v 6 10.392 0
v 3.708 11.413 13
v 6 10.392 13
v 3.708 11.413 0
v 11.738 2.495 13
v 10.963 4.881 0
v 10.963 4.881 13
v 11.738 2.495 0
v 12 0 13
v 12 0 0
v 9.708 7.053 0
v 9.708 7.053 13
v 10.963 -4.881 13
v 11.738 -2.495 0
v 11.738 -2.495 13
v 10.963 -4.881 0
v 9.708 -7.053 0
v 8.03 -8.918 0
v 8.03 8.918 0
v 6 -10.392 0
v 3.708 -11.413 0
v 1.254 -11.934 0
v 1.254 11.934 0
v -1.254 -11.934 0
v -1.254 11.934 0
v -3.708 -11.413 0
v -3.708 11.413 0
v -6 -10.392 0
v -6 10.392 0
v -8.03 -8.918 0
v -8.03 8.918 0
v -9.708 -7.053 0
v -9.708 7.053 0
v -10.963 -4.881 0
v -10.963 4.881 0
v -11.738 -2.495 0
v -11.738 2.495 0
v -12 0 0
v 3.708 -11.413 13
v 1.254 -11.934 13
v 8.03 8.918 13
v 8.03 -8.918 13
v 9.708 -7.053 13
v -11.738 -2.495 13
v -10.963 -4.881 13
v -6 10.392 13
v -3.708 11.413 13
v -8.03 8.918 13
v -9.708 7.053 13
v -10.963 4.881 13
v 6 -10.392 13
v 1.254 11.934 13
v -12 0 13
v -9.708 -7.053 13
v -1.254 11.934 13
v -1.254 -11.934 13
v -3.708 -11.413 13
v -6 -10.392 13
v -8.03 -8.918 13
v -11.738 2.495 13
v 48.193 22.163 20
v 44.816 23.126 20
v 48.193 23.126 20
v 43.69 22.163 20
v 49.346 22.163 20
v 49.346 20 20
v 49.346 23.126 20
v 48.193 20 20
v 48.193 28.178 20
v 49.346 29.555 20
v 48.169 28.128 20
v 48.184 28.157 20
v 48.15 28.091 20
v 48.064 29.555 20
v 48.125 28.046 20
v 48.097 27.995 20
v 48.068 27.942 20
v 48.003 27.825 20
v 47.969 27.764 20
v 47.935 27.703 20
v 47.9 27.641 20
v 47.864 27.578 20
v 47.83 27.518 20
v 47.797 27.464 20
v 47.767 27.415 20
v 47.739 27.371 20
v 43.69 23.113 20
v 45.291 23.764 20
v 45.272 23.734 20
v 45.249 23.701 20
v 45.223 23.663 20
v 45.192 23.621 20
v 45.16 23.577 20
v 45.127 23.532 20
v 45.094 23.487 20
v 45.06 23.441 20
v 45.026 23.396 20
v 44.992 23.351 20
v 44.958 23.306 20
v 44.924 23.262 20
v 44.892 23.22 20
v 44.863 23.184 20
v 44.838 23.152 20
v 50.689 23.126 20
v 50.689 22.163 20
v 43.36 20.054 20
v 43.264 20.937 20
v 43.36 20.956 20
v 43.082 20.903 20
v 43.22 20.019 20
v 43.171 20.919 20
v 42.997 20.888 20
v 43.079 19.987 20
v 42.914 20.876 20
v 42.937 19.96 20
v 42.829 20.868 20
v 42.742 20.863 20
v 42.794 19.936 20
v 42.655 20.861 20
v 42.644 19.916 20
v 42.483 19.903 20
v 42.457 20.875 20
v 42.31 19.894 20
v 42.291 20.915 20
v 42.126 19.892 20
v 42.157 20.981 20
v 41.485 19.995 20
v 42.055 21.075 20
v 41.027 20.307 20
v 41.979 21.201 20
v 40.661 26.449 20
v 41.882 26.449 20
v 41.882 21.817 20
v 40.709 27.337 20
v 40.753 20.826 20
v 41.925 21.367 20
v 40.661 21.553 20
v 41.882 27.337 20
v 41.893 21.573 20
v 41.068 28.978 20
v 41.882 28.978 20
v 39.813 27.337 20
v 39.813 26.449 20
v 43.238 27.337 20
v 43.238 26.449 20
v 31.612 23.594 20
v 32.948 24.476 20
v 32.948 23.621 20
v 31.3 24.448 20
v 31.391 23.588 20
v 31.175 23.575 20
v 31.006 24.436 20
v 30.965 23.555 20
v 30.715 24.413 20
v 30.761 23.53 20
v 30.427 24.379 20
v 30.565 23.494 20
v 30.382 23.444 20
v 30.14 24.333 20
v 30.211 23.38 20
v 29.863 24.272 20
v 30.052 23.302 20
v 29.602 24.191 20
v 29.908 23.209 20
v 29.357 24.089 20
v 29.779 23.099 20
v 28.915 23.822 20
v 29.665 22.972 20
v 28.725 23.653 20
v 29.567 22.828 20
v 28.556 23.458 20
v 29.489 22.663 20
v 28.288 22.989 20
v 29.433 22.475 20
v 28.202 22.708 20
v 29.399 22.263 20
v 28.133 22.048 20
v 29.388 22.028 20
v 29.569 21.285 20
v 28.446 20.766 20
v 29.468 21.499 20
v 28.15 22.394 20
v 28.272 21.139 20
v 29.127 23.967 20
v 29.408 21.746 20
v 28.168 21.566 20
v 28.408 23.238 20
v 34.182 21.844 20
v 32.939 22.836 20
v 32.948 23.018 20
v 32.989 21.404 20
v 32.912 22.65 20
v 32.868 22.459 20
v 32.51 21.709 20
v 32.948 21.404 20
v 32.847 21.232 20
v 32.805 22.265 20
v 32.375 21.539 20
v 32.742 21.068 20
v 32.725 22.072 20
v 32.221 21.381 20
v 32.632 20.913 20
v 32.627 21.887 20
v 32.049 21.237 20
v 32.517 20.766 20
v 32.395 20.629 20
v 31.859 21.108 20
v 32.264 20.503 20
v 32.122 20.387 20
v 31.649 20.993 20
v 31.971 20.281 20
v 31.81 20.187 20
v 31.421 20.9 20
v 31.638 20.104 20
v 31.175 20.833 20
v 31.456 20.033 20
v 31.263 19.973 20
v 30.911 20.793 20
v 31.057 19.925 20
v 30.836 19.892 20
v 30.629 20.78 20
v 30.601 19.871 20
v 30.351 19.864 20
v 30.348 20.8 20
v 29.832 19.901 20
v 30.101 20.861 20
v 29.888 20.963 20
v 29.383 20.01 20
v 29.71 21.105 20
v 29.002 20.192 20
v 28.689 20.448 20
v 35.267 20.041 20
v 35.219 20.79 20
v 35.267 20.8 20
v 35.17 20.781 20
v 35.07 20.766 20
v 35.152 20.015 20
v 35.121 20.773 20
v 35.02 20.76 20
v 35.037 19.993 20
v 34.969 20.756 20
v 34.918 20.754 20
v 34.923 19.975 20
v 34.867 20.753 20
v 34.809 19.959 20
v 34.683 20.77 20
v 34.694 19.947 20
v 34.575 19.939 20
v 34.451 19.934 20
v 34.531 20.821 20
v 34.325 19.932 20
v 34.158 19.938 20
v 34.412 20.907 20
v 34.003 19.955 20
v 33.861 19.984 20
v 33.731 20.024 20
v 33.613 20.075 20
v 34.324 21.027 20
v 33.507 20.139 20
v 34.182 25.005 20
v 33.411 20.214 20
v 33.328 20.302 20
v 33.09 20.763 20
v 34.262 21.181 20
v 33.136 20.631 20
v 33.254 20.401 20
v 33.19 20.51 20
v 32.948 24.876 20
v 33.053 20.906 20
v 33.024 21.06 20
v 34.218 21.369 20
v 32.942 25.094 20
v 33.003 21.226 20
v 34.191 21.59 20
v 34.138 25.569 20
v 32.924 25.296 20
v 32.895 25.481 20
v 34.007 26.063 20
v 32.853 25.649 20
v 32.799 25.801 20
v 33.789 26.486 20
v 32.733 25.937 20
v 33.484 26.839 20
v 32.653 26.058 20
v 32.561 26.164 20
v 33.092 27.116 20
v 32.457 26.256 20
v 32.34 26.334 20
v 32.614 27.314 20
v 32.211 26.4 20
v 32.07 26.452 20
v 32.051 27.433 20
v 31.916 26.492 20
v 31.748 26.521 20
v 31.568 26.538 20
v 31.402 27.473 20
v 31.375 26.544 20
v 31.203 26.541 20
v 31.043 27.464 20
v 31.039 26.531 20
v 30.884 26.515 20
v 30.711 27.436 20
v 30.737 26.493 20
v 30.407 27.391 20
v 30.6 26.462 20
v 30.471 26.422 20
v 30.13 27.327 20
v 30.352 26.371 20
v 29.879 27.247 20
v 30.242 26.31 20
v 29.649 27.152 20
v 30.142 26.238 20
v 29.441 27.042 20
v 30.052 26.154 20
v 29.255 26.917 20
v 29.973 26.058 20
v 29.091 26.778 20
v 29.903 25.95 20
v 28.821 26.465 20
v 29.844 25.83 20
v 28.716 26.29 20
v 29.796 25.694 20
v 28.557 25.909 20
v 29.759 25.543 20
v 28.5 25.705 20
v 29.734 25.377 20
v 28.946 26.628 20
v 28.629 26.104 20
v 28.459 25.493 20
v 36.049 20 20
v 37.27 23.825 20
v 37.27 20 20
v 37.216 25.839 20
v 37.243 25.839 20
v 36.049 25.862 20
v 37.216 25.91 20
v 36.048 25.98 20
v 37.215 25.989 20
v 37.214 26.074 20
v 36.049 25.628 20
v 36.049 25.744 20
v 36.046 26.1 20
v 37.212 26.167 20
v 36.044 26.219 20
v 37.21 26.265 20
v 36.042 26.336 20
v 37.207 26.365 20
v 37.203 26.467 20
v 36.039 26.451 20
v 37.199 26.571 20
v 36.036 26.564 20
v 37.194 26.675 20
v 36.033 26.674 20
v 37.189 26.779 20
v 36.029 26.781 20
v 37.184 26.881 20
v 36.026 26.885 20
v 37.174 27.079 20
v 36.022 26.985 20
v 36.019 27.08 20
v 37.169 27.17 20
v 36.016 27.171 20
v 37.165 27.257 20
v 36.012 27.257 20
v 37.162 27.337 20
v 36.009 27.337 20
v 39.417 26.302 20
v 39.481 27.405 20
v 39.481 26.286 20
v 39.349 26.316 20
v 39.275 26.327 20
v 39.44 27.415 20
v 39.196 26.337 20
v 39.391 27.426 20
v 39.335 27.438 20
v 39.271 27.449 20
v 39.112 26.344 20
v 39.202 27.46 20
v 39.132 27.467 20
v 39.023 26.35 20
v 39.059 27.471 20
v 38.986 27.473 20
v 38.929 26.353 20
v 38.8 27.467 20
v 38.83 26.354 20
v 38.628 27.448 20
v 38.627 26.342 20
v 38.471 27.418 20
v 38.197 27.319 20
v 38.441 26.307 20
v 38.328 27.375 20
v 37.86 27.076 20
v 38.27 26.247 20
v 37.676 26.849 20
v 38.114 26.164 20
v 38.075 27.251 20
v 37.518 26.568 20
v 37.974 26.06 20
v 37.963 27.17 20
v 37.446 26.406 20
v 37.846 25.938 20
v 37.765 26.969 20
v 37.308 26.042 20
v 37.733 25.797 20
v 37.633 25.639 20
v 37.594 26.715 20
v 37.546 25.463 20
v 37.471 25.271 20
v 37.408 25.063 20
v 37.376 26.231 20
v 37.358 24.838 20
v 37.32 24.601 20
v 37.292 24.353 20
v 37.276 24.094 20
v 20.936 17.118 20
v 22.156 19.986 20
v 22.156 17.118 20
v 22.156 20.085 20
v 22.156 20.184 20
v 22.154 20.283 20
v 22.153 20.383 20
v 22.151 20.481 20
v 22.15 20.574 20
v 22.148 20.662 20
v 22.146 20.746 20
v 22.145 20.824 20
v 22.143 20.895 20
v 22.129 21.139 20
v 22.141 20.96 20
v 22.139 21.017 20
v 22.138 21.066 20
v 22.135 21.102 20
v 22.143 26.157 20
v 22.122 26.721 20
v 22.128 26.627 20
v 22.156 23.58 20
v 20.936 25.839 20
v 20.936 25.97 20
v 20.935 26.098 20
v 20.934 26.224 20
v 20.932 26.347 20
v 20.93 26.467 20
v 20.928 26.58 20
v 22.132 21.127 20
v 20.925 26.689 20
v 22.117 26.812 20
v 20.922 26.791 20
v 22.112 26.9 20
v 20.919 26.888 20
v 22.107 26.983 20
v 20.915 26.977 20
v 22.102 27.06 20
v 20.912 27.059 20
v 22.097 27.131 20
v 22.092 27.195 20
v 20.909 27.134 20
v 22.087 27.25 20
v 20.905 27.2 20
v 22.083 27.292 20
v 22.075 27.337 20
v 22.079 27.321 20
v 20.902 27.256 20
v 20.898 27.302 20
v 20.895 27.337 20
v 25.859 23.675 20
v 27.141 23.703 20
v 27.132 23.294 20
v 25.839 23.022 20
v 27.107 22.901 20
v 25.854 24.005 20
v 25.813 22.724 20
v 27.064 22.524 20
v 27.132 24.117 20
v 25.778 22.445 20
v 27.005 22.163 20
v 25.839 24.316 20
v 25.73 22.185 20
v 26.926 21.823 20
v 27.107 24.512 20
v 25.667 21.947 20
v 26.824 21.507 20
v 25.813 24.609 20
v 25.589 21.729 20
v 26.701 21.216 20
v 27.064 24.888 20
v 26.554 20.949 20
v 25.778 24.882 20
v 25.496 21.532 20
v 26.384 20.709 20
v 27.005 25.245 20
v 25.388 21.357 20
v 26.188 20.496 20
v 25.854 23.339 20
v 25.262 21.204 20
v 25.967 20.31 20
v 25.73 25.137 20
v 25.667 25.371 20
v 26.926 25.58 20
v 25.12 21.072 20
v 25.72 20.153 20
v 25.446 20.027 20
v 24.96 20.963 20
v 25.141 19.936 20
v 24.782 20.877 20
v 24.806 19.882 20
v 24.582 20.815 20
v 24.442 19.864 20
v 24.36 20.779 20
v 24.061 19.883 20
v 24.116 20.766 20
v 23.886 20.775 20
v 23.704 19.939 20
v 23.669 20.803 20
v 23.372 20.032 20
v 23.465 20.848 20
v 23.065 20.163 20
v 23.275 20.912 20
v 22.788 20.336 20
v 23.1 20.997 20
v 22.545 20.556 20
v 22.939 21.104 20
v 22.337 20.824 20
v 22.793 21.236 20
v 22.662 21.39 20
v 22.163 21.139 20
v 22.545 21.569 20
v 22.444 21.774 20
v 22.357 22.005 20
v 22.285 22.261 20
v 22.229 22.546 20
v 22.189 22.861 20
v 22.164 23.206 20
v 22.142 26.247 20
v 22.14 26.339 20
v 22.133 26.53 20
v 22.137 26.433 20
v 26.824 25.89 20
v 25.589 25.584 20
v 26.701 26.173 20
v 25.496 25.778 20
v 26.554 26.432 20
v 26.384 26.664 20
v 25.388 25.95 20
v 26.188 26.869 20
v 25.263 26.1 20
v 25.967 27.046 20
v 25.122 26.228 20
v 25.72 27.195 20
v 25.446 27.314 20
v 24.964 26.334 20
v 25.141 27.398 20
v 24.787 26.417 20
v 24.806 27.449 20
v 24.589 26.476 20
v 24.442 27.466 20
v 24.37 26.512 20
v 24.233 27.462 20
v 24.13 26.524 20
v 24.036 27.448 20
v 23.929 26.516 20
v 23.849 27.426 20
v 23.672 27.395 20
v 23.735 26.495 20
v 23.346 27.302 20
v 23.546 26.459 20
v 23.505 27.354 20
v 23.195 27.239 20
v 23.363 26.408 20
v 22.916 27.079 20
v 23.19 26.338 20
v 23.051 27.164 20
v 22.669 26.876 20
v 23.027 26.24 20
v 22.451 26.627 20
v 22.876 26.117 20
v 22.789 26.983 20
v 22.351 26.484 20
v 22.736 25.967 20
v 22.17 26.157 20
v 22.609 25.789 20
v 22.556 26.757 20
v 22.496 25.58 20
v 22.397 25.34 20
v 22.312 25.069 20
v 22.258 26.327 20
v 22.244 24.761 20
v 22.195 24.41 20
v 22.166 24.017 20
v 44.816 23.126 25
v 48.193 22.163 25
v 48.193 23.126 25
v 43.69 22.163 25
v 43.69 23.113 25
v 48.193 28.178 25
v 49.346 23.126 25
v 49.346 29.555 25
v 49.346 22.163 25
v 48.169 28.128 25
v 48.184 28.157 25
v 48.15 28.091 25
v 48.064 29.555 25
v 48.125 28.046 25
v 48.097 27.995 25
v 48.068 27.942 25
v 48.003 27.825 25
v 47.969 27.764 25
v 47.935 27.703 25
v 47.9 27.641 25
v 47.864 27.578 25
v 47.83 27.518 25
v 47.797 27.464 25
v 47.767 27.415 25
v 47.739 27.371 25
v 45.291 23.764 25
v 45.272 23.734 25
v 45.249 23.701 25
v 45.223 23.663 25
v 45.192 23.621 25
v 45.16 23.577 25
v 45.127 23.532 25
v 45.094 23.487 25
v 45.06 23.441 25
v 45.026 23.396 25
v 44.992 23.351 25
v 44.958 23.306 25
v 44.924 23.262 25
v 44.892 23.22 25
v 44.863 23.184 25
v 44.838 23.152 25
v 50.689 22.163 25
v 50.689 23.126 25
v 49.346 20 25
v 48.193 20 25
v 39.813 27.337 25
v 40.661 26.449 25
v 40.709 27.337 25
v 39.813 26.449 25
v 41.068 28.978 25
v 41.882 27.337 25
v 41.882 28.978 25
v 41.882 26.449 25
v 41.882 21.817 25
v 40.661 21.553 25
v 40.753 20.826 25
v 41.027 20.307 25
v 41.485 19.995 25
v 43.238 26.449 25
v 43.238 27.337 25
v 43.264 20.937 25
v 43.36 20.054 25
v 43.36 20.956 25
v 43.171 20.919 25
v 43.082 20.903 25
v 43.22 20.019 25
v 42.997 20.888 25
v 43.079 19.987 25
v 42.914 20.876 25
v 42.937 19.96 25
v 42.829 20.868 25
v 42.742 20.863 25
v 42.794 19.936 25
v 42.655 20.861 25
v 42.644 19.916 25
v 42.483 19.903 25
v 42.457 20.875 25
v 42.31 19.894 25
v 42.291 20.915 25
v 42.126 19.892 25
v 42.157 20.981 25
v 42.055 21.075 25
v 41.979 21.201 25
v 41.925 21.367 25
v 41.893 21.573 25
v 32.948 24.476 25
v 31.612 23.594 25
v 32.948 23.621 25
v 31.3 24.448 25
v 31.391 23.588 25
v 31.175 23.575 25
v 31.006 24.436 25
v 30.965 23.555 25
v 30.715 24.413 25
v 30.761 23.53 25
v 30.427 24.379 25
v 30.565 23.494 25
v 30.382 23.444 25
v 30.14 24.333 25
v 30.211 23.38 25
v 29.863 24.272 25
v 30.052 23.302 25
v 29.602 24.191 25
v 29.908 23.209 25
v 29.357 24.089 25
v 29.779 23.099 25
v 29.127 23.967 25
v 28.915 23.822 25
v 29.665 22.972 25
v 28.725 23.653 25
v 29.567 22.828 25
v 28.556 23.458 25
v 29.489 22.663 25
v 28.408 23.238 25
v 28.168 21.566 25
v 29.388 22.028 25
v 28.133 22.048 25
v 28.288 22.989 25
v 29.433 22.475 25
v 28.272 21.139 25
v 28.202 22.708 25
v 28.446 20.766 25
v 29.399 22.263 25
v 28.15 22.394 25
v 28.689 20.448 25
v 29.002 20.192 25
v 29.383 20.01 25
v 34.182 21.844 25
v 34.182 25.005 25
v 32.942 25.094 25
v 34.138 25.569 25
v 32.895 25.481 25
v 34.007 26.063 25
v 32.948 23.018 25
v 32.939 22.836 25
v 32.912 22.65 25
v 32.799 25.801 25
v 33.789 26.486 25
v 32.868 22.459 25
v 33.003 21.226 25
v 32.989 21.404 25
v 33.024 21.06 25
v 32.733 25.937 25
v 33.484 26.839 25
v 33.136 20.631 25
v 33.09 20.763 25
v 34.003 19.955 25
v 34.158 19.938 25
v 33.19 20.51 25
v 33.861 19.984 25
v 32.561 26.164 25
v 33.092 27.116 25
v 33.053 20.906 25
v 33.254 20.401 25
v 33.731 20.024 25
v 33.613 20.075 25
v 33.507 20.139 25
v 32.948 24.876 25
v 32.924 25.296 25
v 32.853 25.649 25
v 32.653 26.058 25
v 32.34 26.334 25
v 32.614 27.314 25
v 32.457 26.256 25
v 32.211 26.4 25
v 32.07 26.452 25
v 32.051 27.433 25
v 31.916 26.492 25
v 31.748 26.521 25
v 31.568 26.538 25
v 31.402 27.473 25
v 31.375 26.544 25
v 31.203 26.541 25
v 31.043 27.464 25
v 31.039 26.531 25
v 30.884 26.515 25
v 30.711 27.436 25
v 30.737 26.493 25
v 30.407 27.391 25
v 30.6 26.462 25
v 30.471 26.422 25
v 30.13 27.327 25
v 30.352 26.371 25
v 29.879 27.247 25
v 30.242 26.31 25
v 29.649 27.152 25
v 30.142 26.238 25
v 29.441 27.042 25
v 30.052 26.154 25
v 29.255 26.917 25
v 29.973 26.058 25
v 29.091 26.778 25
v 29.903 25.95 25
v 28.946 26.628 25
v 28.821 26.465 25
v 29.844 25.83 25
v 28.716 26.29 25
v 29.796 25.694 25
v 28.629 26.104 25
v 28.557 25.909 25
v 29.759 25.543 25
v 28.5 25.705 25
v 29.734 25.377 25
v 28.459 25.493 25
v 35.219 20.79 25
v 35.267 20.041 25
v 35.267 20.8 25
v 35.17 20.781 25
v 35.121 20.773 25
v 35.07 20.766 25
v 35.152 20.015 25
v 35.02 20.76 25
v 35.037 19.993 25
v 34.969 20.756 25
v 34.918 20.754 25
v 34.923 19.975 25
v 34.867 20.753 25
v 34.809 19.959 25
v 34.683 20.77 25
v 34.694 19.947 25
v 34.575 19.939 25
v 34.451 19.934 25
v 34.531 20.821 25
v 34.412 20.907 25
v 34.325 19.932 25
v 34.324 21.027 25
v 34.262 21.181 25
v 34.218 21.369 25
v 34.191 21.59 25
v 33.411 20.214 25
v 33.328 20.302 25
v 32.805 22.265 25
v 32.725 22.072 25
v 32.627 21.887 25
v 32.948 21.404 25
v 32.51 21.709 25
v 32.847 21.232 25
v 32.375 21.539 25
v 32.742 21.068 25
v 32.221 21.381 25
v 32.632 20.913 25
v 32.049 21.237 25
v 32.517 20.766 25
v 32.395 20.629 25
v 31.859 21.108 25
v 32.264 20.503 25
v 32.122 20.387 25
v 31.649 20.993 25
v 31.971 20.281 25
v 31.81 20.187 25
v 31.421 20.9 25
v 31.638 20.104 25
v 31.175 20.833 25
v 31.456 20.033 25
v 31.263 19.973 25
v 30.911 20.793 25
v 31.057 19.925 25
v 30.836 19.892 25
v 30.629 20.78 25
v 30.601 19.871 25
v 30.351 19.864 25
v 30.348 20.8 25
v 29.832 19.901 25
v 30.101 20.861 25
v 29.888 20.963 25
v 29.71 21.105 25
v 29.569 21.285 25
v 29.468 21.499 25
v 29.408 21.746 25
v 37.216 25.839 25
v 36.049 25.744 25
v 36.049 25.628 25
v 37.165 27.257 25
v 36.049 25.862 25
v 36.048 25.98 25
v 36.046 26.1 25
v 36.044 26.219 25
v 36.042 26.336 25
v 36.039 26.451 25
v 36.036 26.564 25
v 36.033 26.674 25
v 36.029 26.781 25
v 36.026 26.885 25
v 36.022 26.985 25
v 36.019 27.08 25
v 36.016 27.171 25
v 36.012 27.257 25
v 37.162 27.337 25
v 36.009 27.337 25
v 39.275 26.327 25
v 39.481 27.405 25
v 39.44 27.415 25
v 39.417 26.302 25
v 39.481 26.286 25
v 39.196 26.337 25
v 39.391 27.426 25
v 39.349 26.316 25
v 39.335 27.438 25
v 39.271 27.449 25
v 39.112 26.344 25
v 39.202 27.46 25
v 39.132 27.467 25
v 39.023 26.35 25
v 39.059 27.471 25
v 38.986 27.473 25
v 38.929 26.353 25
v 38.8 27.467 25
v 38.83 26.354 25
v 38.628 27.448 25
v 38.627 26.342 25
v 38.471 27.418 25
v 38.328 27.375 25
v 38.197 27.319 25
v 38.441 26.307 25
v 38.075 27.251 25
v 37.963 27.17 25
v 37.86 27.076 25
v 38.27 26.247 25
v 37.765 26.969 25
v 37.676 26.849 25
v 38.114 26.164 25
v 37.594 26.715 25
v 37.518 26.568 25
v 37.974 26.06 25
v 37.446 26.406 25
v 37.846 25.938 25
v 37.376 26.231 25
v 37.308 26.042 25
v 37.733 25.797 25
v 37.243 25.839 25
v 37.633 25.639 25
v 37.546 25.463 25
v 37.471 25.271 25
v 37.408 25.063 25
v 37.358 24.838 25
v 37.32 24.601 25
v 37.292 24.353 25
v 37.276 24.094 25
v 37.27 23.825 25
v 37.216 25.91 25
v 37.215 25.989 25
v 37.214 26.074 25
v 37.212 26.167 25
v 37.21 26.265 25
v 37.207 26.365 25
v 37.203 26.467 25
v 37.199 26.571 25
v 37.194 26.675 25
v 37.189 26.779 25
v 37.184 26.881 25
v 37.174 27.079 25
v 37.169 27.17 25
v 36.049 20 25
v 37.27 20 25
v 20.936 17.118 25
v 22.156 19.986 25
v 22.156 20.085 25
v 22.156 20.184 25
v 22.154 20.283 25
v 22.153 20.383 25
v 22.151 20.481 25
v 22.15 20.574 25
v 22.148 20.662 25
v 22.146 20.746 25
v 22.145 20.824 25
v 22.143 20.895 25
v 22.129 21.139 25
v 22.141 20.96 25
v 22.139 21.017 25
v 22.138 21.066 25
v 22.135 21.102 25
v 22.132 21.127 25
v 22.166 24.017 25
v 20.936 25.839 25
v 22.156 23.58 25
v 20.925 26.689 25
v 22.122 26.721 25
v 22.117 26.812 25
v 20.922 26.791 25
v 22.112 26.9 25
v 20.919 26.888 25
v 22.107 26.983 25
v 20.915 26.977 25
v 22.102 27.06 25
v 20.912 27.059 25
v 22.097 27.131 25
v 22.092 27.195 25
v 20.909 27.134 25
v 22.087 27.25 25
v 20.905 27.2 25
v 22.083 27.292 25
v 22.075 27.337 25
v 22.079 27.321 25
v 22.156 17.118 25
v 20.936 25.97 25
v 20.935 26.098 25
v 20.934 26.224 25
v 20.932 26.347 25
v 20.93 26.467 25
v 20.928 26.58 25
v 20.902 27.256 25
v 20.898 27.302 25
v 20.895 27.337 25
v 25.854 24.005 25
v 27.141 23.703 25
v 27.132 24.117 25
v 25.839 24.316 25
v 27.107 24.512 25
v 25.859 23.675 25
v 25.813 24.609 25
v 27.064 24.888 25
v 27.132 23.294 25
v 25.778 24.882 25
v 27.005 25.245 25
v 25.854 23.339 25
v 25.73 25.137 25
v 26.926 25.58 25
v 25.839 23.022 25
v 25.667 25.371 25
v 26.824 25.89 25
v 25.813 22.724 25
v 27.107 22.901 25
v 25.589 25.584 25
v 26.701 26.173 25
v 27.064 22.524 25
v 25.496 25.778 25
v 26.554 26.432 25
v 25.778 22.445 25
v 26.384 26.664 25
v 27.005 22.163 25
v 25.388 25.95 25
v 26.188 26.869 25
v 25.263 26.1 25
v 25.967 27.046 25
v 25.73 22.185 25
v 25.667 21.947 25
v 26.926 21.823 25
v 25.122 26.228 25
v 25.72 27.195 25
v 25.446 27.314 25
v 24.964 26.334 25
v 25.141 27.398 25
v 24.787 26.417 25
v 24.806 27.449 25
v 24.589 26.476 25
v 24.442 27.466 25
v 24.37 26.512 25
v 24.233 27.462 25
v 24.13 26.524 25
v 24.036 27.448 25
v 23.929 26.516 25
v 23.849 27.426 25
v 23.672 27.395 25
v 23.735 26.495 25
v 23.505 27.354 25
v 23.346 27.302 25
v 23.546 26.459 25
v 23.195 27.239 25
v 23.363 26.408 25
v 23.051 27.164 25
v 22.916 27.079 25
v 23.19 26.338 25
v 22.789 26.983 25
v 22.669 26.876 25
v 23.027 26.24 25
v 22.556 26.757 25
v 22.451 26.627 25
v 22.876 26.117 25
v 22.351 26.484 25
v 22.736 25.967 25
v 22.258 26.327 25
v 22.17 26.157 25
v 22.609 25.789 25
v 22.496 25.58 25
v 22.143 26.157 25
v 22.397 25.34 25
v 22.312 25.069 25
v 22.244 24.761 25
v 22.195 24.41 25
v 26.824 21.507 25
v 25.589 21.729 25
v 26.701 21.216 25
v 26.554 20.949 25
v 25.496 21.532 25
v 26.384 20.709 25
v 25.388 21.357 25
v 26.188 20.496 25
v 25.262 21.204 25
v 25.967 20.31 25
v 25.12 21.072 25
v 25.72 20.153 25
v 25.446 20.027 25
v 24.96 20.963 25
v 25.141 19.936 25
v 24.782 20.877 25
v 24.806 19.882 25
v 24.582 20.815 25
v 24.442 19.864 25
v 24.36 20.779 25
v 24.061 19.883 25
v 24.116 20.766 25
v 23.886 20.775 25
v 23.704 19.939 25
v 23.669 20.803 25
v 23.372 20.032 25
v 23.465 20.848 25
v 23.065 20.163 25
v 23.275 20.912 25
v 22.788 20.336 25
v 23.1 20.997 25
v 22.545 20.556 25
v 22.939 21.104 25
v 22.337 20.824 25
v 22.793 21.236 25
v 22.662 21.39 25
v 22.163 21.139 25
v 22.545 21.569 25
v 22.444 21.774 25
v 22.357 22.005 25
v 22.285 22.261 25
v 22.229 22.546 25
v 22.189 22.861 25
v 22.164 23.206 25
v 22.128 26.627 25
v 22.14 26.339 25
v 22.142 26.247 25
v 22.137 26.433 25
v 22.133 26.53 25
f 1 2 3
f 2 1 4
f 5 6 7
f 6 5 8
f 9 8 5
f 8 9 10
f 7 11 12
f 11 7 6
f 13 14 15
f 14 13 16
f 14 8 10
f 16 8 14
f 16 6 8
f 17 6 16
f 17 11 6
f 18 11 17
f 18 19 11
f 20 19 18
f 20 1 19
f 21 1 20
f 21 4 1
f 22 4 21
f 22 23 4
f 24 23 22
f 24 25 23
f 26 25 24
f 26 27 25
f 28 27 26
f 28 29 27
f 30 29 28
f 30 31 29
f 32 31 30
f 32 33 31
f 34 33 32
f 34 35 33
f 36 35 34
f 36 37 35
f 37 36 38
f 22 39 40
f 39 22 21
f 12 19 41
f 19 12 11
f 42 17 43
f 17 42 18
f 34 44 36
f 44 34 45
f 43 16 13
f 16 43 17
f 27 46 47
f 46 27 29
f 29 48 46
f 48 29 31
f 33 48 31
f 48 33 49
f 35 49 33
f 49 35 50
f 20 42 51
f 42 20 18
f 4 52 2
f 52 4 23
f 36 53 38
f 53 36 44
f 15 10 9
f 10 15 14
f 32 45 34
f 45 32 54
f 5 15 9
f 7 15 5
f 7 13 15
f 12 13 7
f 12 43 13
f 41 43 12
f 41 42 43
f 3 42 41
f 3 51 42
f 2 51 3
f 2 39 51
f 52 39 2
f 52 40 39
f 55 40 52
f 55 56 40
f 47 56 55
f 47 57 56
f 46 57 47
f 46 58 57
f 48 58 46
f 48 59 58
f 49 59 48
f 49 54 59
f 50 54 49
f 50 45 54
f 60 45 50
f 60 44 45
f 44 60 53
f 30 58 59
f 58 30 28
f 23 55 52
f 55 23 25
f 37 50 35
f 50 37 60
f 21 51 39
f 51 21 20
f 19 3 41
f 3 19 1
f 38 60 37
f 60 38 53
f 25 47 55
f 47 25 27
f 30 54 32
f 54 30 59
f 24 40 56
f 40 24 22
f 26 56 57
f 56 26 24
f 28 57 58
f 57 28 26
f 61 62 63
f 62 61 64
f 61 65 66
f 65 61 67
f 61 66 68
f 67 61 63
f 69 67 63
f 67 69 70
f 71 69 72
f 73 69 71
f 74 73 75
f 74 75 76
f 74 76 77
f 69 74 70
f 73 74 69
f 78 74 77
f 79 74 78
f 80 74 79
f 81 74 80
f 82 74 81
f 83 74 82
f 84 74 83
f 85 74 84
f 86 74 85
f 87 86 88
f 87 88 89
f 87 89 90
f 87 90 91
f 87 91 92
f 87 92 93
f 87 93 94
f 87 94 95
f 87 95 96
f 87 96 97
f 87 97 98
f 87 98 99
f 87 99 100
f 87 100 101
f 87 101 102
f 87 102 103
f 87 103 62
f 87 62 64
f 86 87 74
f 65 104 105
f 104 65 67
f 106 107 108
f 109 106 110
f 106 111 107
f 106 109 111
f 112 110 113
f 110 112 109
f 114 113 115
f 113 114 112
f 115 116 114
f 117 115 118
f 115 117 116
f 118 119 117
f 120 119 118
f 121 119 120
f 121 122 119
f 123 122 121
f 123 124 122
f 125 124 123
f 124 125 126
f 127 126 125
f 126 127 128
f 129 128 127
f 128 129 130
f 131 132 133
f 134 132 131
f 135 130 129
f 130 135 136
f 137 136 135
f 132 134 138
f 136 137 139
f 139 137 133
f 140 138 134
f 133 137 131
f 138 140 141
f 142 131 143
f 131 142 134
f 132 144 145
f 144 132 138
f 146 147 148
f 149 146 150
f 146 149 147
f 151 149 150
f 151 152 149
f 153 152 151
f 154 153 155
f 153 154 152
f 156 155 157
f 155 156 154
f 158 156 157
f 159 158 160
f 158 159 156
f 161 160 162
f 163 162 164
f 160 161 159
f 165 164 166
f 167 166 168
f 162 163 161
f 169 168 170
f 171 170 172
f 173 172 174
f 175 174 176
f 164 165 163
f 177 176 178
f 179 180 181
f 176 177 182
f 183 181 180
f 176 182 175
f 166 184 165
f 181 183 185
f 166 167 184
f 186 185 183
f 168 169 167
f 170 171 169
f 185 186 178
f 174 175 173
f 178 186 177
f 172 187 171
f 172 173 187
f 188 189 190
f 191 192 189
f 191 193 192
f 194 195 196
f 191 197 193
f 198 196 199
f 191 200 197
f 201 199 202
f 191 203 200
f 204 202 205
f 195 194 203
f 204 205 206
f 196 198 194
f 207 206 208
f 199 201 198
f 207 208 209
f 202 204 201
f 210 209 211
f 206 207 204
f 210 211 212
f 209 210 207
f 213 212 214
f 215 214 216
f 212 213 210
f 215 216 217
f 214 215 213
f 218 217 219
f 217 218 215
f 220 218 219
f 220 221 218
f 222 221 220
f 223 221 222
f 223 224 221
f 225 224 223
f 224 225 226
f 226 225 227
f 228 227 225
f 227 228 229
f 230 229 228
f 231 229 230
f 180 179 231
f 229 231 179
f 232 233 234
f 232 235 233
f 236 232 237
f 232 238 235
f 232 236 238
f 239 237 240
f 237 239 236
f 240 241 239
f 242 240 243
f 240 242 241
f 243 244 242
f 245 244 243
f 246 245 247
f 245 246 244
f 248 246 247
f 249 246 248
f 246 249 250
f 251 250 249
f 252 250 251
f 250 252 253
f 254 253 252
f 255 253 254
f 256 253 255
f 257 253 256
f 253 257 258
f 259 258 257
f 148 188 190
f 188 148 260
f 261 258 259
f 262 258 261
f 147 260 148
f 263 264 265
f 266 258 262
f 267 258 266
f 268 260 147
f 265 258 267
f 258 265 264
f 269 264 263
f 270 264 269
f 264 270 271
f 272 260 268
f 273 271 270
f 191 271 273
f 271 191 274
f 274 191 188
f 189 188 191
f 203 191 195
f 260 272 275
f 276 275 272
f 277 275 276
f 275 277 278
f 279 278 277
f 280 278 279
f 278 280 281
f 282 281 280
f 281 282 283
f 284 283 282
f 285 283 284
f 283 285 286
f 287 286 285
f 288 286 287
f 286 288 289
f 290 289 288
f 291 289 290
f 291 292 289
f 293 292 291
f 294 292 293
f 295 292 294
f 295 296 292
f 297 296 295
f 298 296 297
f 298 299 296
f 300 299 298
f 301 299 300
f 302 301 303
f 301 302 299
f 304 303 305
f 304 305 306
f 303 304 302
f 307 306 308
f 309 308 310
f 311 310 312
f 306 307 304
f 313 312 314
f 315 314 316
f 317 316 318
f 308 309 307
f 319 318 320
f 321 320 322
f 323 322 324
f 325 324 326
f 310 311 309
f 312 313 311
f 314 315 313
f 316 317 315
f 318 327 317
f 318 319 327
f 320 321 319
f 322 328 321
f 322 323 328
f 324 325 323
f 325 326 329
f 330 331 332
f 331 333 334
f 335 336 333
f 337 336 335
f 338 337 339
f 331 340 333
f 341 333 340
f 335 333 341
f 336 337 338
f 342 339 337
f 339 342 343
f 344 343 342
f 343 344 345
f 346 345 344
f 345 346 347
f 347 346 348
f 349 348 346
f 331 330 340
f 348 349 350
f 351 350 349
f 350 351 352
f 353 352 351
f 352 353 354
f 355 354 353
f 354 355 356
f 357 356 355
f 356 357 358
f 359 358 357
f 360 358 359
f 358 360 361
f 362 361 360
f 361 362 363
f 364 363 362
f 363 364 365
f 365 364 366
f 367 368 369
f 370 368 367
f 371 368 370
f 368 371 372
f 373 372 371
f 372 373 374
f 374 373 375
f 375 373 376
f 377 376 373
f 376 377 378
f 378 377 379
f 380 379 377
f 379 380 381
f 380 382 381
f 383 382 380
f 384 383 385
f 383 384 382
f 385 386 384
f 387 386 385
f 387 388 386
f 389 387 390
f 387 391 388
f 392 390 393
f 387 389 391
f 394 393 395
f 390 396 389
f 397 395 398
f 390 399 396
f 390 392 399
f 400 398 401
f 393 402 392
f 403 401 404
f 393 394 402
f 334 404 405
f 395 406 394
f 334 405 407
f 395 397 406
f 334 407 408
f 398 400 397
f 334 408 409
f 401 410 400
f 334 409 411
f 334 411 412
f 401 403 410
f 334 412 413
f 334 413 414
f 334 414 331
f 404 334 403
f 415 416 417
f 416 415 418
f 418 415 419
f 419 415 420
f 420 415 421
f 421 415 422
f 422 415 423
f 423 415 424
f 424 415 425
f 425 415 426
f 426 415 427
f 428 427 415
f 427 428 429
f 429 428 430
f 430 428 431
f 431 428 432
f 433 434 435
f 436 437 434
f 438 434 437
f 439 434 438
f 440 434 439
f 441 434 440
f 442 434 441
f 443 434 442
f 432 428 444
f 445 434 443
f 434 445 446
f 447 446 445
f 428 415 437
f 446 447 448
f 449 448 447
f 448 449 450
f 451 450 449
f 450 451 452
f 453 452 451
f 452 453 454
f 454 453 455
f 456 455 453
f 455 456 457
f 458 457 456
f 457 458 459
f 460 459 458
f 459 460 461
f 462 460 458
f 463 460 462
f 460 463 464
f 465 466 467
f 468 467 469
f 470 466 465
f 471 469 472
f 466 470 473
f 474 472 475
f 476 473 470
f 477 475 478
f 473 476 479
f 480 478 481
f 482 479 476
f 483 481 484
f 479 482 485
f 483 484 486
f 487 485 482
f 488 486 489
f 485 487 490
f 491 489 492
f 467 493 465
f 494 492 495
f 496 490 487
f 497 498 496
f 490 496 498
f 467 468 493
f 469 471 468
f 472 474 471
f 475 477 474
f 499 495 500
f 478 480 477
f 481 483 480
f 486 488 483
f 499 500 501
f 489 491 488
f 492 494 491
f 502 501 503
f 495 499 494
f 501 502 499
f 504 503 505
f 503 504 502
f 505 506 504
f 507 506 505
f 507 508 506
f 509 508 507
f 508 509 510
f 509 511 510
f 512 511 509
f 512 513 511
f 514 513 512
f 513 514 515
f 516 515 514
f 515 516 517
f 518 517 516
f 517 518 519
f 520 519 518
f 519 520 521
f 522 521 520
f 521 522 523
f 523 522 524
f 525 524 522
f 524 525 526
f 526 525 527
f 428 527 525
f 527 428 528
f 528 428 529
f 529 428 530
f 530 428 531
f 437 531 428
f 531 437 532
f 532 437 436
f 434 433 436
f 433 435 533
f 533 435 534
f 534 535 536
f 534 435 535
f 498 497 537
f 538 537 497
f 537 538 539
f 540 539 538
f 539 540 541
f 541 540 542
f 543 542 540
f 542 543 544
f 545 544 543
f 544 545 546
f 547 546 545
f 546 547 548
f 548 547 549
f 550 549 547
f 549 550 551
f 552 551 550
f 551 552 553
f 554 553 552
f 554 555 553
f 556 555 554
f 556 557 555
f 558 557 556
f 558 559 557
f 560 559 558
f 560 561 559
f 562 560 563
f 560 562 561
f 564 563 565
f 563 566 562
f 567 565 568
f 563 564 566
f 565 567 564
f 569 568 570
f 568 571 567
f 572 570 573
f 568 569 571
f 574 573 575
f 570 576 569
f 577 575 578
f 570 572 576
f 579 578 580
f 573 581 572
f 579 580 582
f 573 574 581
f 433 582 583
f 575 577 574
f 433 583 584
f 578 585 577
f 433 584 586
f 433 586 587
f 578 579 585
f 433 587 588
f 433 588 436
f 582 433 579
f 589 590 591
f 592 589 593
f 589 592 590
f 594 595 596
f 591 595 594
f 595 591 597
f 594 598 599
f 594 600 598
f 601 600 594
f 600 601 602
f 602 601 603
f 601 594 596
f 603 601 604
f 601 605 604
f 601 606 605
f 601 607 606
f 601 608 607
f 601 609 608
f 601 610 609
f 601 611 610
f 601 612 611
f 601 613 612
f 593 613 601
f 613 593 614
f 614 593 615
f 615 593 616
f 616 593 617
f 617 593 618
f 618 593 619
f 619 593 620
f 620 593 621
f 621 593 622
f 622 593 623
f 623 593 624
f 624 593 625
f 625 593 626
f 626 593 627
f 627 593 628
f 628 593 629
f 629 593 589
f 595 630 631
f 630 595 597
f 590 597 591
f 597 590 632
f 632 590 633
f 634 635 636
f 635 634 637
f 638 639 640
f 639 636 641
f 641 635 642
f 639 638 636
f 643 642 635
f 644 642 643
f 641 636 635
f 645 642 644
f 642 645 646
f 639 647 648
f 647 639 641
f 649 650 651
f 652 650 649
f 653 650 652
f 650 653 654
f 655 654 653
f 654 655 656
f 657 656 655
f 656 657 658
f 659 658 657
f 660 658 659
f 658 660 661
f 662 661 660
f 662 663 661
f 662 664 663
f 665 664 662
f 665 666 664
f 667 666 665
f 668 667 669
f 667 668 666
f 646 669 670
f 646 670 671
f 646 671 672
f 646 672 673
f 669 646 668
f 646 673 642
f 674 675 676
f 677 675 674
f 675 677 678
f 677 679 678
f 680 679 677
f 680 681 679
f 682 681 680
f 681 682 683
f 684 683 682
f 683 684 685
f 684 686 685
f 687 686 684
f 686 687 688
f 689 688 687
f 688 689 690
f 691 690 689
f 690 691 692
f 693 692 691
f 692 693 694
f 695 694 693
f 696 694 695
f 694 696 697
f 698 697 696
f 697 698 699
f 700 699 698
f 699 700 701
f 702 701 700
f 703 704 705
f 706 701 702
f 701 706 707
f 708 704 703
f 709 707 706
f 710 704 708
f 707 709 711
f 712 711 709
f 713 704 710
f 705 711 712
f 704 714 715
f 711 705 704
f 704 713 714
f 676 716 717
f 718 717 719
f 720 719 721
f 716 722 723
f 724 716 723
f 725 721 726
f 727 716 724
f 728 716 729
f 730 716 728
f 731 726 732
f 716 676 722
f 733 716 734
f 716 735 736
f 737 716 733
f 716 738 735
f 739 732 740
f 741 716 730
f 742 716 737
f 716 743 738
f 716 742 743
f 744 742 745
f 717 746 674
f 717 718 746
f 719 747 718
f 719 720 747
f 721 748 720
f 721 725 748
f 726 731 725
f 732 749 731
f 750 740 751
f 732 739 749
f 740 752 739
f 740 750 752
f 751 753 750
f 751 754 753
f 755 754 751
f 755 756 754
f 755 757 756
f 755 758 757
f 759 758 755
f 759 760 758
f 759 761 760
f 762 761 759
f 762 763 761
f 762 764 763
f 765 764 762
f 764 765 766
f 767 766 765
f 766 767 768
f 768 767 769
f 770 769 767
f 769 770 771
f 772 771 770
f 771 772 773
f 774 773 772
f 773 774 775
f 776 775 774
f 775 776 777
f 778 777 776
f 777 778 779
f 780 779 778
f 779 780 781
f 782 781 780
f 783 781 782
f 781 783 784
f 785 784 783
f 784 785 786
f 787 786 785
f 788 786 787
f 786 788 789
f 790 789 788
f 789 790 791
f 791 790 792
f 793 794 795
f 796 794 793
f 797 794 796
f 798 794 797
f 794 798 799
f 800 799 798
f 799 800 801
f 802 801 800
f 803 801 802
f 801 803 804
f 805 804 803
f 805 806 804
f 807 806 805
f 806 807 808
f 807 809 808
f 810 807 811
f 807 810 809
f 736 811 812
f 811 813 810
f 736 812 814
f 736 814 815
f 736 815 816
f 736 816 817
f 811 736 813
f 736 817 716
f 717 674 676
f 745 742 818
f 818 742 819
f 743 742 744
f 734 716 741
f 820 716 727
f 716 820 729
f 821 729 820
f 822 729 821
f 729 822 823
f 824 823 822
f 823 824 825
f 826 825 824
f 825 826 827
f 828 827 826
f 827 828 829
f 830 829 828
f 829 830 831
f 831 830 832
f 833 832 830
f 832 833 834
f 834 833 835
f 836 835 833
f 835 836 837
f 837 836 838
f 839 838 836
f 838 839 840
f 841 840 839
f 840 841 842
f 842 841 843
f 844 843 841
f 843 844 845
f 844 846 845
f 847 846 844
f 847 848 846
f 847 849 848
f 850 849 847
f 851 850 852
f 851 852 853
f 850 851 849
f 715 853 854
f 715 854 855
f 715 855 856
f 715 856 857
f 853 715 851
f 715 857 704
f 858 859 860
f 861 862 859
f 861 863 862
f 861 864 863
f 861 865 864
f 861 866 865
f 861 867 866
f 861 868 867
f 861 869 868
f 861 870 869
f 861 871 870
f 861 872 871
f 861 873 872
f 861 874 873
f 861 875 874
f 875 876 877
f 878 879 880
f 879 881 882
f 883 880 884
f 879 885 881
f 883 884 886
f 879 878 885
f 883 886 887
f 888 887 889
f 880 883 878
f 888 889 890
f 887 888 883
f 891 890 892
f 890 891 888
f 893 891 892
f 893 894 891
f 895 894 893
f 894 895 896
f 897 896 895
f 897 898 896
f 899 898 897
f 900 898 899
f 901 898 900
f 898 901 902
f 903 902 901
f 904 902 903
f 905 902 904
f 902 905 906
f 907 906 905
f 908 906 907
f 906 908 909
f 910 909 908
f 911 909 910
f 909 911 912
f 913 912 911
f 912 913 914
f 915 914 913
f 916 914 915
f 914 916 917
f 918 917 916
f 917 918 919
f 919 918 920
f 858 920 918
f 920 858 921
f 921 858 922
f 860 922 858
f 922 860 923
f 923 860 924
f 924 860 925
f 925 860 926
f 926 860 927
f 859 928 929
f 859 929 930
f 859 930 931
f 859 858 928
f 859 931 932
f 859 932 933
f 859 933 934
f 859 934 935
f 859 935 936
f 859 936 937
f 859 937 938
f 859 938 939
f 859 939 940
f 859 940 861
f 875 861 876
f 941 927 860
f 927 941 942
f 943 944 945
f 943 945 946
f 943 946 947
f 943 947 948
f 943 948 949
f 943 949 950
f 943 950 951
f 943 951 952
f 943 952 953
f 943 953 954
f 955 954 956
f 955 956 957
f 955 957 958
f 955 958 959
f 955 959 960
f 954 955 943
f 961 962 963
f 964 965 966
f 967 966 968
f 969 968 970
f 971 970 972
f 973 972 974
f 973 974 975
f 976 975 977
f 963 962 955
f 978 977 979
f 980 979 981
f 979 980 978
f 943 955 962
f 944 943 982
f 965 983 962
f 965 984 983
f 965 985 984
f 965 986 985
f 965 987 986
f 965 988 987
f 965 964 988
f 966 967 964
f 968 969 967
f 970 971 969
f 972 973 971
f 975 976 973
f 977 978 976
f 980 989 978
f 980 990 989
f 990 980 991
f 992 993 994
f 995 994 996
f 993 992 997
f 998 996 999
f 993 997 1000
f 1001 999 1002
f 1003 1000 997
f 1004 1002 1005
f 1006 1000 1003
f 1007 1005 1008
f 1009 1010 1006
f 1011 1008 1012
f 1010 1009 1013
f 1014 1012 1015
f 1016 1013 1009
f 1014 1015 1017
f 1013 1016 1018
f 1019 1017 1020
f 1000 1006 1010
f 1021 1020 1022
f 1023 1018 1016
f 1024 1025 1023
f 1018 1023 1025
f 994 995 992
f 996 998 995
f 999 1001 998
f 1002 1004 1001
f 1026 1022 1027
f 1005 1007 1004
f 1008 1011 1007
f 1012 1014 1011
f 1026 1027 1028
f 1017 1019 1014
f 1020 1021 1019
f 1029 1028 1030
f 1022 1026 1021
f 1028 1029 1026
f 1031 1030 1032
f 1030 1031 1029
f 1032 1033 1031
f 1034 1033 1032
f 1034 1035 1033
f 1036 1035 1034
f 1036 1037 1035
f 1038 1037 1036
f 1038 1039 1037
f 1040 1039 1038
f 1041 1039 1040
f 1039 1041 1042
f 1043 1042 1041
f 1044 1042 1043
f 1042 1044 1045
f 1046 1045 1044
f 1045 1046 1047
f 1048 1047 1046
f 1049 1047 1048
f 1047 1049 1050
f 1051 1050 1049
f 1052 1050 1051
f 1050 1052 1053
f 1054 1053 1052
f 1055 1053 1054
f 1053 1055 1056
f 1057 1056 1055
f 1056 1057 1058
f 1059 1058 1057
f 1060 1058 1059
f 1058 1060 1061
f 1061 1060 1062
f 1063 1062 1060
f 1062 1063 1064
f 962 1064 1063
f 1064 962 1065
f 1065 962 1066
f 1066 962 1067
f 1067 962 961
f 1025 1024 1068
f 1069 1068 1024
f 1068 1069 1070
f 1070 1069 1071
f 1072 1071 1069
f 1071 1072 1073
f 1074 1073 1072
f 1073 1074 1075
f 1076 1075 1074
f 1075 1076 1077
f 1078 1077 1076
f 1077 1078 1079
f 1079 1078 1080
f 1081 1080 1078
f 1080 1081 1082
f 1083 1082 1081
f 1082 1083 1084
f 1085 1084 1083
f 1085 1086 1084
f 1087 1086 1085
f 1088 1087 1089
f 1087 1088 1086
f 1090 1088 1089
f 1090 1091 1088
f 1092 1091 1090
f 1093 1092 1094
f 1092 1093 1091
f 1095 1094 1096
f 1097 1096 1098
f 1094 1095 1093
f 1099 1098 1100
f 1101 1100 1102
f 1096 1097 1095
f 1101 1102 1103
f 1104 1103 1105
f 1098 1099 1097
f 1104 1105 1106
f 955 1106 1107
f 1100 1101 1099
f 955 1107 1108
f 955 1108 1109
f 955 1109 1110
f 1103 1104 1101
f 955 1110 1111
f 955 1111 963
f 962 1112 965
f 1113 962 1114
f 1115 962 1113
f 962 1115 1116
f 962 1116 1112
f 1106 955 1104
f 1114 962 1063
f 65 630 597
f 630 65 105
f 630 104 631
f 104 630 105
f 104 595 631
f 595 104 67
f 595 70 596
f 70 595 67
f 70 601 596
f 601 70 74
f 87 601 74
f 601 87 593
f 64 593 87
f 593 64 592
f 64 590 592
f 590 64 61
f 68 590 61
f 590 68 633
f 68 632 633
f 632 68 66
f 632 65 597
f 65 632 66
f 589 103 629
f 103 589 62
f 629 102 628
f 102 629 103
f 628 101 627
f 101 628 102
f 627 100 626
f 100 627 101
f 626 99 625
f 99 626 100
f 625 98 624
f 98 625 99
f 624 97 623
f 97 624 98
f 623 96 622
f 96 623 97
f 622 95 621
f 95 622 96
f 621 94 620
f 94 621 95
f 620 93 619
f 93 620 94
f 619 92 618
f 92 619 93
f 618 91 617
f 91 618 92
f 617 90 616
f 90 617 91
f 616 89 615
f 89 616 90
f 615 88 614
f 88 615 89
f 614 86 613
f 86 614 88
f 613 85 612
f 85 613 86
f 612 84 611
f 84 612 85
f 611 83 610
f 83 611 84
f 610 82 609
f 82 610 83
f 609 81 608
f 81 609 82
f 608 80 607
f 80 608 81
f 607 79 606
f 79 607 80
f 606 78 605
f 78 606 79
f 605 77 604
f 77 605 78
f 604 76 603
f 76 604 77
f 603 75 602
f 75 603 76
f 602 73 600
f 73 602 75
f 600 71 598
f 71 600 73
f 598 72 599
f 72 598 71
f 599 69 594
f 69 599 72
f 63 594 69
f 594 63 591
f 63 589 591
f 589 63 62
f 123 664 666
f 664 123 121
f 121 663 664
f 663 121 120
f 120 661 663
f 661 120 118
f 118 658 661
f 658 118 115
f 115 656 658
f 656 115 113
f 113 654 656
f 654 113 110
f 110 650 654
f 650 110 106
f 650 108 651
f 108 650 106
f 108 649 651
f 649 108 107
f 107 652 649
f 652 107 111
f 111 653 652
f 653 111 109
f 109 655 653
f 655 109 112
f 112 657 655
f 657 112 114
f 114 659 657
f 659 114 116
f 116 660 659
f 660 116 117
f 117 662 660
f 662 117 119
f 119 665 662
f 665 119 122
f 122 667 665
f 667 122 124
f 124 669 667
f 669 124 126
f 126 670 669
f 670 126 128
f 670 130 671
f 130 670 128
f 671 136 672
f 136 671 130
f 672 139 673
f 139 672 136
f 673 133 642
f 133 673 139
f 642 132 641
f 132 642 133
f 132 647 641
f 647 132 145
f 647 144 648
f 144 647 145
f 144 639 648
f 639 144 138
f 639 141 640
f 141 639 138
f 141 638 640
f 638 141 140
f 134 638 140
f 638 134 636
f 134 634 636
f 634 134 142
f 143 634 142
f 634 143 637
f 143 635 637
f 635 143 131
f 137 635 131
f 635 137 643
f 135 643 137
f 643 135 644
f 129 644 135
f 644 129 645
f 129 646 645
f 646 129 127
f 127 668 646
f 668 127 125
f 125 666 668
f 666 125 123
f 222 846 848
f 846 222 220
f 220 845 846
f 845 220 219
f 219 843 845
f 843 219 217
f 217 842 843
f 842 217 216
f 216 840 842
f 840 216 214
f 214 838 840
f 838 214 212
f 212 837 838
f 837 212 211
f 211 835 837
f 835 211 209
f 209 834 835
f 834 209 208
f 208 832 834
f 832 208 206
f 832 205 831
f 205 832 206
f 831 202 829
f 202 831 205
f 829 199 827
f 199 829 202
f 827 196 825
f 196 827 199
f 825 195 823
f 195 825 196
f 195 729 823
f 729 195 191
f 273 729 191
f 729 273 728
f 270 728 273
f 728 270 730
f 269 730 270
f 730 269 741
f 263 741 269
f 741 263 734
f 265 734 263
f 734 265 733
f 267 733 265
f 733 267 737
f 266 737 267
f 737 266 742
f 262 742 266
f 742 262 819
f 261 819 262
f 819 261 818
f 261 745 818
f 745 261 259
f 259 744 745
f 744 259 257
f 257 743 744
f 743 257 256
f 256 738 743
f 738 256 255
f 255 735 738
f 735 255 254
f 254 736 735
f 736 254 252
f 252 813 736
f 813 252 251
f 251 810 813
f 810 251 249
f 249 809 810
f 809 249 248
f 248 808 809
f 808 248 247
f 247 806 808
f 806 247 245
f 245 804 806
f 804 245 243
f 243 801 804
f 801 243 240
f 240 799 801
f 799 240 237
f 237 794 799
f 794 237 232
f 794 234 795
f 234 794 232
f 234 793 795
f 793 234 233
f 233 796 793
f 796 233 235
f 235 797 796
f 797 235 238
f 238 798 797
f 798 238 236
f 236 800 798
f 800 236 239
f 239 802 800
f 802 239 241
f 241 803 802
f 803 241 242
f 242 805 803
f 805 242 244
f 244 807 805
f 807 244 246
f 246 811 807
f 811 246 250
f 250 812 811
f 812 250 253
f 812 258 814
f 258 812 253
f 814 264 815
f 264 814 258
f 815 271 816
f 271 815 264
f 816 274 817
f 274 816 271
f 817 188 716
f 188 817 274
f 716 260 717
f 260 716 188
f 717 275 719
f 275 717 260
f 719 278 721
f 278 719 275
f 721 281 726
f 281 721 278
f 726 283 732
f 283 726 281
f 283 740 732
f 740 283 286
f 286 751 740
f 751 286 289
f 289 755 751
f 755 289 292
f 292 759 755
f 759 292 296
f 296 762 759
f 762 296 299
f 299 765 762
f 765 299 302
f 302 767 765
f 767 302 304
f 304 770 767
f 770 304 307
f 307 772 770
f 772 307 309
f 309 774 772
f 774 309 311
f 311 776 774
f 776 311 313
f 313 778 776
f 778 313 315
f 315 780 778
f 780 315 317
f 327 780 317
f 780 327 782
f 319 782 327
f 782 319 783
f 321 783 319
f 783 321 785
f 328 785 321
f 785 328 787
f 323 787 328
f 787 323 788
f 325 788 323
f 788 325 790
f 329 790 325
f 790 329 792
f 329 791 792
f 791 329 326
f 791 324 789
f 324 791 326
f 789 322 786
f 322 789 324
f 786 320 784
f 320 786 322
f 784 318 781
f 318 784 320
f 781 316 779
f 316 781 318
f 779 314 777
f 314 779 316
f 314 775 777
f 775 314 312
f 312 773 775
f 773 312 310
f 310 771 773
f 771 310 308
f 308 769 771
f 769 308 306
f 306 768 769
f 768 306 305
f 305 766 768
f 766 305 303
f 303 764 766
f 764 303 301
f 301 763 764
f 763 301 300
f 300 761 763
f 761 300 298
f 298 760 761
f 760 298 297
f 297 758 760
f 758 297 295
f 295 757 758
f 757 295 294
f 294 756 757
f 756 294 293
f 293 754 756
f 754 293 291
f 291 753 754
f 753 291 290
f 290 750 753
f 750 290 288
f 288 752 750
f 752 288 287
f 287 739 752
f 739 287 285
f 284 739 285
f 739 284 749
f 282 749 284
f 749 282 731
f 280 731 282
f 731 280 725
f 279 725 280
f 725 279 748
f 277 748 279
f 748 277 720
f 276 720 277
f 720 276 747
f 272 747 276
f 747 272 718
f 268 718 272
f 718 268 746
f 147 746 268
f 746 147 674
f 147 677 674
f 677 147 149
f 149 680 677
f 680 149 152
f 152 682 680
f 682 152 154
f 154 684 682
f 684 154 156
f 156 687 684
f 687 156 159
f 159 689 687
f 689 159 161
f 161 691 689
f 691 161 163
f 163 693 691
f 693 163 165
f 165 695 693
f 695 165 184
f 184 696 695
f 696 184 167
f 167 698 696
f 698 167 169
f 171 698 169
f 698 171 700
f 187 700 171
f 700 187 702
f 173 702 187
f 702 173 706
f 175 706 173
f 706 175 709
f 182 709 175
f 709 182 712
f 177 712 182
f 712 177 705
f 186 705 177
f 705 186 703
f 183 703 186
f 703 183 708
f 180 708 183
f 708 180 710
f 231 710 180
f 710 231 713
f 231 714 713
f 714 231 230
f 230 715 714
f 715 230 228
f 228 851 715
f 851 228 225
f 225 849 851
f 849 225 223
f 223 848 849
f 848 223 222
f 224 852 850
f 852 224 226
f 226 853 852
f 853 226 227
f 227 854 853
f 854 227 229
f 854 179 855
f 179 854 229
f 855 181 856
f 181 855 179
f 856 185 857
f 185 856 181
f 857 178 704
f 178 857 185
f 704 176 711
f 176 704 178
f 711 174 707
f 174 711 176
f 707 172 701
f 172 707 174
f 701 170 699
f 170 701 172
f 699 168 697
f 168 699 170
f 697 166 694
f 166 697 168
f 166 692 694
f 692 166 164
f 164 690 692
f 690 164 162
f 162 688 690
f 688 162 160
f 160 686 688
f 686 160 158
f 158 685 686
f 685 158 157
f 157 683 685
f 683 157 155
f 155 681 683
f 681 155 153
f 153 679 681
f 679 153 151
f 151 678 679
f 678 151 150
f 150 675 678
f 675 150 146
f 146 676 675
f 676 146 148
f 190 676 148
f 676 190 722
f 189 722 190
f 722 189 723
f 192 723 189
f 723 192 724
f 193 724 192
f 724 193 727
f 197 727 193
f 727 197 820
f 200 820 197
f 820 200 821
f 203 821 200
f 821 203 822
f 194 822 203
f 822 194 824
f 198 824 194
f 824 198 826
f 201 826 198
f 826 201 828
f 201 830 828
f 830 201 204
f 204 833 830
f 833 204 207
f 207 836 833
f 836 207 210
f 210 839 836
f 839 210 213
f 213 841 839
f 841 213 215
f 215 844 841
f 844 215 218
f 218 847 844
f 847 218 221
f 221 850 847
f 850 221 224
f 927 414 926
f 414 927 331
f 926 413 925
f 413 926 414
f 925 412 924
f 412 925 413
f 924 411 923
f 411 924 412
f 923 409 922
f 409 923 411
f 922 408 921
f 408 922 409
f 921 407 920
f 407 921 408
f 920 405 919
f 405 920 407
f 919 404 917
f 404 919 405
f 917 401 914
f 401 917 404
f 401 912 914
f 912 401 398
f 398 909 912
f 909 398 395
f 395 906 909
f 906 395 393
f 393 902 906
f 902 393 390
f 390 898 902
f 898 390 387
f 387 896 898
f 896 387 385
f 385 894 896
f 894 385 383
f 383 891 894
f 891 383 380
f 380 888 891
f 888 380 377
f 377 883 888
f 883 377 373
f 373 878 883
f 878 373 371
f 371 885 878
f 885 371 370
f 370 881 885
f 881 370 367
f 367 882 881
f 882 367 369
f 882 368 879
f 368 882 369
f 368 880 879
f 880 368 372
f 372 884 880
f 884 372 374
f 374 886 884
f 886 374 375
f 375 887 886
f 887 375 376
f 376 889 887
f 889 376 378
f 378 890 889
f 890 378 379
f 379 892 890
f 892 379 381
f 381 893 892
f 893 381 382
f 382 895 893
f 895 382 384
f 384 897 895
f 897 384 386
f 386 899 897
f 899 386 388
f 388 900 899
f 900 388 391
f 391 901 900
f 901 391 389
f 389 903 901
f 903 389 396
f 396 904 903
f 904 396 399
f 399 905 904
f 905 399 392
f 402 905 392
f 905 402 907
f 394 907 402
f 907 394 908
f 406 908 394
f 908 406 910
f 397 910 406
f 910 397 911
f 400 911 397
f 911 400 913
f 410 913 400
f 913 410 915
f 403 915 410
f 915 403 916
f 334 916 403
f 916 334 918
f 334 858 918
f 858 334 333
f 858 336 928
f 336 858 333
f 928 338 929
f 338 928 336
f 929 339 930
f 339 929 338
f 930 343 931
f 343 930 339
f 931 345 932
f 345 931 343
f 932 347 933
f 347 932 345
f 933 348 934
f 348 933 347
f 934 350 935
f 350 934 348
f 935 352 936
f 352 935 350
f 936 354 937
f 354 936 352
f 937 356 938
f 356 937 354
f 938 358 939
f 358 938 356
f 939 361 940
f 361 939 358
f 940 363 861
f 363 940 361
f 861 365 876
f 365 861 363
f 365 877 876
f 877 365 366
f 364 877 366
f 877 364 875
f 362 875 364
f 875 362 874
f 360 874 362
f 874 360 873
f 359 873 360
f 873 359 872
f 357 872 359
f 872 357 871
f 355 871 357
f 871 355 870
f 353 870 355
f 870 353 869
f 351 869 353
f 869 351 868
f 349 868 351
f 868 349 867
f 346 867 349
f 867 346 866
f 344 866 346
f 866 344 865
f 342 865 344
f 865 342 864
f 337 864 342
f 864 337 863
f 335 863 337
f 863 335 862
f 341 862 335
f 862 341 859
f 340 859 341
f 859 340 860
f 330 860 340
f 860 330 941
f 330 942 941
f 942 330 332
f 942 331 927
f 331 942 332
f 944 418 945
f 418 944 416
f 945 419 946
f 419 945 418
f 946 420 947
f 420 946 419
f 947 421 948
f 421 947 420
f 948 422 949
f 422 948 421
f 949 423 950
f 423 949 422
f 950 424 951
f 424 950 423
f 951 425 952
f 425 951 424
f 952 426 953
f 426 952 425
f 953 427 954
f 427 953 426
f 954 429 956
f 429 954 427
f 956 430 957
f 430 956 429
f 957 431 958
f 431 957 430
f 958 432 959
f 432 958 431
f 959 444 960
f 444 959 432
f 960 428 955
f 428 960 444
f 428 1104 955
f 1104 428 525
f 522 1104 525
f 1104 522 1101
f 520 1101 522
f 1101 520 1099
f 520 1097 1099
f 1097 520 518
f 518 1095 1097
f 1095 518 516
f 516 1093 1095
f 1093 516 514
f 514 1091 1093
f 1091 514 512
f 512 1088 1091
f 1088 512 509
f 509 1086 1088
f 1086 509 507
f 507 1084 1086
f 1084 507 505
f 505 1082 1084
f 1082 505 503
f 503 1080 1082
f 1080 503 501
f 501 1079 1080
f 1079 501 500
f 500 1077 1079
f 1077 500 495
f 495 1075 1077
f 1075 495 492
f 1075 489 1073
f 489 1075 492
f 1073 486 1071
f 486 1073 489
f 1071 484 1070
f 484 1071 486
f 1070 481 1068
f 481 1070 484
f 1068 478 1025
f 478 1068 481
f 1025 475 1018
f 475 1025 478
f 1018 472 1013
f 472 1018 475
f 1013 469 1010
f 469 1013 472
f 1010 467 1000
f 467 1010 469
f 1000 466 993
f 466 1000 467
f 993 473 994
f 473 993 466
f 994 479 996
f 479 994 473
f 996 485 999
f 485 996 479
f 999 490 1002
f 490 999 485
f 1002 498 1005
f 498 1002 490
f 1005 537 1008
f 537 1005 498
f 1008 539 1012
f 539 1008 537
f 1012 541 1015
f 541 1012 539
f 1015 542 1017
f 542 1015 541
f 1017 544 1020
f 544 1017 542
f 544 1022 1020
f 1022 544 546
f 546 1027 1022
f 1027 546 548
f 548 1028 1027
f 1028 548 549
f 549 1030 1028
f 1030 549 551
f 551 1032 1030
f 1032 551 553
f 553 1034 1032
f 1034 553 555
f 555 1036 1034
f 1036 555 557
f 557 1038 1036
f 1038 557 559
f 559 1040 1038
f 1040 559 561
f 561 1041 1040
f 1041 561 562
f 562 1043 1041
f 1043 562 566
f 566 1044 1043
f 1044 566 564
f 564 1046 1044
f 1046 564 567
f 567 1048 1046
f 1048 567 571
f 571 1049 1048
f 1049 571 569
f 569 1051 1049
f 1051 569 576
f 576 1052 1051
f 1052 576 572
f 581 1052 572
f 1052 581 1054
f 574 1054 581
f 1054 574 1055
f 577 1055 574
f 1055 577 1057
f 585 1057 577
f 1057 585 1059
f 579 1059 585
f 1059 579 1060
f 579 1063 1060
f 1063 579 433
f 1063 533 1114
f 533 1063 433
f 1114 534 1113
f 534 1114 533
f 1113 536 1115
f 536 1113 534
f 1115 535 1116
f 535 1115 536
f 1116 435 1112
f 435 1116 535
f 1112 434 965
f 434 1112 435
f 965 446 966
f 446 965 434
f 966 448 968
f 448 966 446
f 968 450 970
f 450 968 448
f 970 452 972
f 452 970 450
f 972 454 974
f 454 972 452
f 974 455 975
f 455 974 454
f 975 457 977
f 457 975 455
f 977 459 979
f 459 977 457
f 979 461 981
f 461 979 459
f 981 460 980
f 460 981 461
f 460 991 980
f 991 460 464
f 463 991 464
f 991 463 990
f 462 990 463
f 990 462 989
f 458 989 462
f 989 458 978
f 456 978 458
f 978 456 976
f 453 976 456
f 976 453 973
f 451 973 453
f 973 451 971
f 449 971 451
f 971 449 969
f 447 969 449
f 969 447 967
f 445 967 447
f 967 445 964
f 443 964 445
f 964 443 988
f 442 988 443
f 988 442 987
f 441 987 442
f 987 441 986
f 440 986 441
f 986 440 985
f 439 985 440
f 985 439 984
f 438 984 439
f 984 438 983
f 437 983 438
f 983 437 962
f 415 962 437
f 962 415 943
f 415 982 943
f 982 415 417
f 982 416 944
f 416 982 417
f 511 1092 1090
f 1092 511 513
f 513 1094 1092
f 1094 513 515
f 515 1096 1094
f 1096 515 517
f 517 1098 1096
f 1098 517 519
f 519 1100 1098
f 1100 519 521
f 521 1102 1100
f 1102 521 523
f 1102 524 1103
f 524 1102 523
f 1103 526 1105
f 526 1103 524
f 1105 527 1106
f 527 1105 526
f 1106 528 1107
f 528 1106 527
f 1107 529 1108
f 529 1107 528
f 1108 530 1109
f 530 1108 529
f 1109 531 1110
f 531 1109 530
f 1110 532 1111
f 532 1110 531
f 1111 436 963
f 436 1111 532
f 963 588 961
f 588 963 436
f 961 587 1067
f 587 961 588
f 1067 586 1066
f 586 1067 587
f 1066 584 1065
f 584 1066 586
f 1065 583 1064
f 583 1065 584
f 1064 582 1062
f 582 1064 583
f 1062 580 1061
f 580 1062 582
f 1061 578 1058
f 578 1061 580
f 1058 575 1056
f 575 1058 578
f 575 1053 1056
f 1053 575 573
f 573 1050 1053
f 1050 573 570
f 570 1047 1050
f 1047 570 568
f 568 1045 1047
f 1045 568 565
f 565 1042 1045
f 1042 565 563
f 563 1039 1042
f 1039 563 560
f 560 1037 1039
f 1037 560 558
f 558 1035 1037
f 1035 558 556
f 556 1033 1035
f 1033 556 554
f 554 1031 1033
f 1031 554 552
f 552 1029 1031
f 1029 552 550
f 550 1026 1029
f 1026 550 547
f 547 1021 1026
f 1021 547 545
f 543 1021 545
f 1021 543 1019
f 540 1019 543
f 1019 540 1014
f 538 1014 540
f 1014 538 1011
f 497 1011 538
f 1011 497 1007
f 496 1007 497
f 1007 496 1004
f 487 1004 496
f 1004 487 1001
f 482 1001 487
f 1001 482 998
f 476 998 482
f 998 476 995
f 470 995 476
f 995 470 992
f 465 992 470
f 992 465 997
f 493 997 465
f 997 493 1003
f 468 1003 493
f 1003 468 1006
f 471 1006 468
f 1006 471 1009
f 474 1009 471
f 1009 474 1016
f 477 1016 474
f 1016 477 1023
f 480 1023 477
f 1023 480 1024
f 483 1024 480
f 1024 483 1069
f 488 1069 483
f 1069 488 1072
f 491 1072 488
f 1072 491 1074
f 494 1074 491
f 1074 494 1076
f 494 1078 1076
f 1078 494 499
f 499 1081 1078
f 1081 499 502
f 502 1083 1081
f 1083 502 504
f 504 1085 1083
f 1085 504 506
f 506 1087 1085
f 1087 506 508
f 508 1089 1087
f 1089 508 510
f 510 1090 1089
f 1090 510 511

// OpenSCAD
//[CUSTOMIZATION]
// Height
h=13;
// Radius
r1=12;
// Message
txt="part4";
module __END_CUSTOMIZATIONS () { }
cylinder(h,r1,r1);
translate([20,20,20]) { linear_extrude(5) text(txt, font="Liberation Sans"); }
